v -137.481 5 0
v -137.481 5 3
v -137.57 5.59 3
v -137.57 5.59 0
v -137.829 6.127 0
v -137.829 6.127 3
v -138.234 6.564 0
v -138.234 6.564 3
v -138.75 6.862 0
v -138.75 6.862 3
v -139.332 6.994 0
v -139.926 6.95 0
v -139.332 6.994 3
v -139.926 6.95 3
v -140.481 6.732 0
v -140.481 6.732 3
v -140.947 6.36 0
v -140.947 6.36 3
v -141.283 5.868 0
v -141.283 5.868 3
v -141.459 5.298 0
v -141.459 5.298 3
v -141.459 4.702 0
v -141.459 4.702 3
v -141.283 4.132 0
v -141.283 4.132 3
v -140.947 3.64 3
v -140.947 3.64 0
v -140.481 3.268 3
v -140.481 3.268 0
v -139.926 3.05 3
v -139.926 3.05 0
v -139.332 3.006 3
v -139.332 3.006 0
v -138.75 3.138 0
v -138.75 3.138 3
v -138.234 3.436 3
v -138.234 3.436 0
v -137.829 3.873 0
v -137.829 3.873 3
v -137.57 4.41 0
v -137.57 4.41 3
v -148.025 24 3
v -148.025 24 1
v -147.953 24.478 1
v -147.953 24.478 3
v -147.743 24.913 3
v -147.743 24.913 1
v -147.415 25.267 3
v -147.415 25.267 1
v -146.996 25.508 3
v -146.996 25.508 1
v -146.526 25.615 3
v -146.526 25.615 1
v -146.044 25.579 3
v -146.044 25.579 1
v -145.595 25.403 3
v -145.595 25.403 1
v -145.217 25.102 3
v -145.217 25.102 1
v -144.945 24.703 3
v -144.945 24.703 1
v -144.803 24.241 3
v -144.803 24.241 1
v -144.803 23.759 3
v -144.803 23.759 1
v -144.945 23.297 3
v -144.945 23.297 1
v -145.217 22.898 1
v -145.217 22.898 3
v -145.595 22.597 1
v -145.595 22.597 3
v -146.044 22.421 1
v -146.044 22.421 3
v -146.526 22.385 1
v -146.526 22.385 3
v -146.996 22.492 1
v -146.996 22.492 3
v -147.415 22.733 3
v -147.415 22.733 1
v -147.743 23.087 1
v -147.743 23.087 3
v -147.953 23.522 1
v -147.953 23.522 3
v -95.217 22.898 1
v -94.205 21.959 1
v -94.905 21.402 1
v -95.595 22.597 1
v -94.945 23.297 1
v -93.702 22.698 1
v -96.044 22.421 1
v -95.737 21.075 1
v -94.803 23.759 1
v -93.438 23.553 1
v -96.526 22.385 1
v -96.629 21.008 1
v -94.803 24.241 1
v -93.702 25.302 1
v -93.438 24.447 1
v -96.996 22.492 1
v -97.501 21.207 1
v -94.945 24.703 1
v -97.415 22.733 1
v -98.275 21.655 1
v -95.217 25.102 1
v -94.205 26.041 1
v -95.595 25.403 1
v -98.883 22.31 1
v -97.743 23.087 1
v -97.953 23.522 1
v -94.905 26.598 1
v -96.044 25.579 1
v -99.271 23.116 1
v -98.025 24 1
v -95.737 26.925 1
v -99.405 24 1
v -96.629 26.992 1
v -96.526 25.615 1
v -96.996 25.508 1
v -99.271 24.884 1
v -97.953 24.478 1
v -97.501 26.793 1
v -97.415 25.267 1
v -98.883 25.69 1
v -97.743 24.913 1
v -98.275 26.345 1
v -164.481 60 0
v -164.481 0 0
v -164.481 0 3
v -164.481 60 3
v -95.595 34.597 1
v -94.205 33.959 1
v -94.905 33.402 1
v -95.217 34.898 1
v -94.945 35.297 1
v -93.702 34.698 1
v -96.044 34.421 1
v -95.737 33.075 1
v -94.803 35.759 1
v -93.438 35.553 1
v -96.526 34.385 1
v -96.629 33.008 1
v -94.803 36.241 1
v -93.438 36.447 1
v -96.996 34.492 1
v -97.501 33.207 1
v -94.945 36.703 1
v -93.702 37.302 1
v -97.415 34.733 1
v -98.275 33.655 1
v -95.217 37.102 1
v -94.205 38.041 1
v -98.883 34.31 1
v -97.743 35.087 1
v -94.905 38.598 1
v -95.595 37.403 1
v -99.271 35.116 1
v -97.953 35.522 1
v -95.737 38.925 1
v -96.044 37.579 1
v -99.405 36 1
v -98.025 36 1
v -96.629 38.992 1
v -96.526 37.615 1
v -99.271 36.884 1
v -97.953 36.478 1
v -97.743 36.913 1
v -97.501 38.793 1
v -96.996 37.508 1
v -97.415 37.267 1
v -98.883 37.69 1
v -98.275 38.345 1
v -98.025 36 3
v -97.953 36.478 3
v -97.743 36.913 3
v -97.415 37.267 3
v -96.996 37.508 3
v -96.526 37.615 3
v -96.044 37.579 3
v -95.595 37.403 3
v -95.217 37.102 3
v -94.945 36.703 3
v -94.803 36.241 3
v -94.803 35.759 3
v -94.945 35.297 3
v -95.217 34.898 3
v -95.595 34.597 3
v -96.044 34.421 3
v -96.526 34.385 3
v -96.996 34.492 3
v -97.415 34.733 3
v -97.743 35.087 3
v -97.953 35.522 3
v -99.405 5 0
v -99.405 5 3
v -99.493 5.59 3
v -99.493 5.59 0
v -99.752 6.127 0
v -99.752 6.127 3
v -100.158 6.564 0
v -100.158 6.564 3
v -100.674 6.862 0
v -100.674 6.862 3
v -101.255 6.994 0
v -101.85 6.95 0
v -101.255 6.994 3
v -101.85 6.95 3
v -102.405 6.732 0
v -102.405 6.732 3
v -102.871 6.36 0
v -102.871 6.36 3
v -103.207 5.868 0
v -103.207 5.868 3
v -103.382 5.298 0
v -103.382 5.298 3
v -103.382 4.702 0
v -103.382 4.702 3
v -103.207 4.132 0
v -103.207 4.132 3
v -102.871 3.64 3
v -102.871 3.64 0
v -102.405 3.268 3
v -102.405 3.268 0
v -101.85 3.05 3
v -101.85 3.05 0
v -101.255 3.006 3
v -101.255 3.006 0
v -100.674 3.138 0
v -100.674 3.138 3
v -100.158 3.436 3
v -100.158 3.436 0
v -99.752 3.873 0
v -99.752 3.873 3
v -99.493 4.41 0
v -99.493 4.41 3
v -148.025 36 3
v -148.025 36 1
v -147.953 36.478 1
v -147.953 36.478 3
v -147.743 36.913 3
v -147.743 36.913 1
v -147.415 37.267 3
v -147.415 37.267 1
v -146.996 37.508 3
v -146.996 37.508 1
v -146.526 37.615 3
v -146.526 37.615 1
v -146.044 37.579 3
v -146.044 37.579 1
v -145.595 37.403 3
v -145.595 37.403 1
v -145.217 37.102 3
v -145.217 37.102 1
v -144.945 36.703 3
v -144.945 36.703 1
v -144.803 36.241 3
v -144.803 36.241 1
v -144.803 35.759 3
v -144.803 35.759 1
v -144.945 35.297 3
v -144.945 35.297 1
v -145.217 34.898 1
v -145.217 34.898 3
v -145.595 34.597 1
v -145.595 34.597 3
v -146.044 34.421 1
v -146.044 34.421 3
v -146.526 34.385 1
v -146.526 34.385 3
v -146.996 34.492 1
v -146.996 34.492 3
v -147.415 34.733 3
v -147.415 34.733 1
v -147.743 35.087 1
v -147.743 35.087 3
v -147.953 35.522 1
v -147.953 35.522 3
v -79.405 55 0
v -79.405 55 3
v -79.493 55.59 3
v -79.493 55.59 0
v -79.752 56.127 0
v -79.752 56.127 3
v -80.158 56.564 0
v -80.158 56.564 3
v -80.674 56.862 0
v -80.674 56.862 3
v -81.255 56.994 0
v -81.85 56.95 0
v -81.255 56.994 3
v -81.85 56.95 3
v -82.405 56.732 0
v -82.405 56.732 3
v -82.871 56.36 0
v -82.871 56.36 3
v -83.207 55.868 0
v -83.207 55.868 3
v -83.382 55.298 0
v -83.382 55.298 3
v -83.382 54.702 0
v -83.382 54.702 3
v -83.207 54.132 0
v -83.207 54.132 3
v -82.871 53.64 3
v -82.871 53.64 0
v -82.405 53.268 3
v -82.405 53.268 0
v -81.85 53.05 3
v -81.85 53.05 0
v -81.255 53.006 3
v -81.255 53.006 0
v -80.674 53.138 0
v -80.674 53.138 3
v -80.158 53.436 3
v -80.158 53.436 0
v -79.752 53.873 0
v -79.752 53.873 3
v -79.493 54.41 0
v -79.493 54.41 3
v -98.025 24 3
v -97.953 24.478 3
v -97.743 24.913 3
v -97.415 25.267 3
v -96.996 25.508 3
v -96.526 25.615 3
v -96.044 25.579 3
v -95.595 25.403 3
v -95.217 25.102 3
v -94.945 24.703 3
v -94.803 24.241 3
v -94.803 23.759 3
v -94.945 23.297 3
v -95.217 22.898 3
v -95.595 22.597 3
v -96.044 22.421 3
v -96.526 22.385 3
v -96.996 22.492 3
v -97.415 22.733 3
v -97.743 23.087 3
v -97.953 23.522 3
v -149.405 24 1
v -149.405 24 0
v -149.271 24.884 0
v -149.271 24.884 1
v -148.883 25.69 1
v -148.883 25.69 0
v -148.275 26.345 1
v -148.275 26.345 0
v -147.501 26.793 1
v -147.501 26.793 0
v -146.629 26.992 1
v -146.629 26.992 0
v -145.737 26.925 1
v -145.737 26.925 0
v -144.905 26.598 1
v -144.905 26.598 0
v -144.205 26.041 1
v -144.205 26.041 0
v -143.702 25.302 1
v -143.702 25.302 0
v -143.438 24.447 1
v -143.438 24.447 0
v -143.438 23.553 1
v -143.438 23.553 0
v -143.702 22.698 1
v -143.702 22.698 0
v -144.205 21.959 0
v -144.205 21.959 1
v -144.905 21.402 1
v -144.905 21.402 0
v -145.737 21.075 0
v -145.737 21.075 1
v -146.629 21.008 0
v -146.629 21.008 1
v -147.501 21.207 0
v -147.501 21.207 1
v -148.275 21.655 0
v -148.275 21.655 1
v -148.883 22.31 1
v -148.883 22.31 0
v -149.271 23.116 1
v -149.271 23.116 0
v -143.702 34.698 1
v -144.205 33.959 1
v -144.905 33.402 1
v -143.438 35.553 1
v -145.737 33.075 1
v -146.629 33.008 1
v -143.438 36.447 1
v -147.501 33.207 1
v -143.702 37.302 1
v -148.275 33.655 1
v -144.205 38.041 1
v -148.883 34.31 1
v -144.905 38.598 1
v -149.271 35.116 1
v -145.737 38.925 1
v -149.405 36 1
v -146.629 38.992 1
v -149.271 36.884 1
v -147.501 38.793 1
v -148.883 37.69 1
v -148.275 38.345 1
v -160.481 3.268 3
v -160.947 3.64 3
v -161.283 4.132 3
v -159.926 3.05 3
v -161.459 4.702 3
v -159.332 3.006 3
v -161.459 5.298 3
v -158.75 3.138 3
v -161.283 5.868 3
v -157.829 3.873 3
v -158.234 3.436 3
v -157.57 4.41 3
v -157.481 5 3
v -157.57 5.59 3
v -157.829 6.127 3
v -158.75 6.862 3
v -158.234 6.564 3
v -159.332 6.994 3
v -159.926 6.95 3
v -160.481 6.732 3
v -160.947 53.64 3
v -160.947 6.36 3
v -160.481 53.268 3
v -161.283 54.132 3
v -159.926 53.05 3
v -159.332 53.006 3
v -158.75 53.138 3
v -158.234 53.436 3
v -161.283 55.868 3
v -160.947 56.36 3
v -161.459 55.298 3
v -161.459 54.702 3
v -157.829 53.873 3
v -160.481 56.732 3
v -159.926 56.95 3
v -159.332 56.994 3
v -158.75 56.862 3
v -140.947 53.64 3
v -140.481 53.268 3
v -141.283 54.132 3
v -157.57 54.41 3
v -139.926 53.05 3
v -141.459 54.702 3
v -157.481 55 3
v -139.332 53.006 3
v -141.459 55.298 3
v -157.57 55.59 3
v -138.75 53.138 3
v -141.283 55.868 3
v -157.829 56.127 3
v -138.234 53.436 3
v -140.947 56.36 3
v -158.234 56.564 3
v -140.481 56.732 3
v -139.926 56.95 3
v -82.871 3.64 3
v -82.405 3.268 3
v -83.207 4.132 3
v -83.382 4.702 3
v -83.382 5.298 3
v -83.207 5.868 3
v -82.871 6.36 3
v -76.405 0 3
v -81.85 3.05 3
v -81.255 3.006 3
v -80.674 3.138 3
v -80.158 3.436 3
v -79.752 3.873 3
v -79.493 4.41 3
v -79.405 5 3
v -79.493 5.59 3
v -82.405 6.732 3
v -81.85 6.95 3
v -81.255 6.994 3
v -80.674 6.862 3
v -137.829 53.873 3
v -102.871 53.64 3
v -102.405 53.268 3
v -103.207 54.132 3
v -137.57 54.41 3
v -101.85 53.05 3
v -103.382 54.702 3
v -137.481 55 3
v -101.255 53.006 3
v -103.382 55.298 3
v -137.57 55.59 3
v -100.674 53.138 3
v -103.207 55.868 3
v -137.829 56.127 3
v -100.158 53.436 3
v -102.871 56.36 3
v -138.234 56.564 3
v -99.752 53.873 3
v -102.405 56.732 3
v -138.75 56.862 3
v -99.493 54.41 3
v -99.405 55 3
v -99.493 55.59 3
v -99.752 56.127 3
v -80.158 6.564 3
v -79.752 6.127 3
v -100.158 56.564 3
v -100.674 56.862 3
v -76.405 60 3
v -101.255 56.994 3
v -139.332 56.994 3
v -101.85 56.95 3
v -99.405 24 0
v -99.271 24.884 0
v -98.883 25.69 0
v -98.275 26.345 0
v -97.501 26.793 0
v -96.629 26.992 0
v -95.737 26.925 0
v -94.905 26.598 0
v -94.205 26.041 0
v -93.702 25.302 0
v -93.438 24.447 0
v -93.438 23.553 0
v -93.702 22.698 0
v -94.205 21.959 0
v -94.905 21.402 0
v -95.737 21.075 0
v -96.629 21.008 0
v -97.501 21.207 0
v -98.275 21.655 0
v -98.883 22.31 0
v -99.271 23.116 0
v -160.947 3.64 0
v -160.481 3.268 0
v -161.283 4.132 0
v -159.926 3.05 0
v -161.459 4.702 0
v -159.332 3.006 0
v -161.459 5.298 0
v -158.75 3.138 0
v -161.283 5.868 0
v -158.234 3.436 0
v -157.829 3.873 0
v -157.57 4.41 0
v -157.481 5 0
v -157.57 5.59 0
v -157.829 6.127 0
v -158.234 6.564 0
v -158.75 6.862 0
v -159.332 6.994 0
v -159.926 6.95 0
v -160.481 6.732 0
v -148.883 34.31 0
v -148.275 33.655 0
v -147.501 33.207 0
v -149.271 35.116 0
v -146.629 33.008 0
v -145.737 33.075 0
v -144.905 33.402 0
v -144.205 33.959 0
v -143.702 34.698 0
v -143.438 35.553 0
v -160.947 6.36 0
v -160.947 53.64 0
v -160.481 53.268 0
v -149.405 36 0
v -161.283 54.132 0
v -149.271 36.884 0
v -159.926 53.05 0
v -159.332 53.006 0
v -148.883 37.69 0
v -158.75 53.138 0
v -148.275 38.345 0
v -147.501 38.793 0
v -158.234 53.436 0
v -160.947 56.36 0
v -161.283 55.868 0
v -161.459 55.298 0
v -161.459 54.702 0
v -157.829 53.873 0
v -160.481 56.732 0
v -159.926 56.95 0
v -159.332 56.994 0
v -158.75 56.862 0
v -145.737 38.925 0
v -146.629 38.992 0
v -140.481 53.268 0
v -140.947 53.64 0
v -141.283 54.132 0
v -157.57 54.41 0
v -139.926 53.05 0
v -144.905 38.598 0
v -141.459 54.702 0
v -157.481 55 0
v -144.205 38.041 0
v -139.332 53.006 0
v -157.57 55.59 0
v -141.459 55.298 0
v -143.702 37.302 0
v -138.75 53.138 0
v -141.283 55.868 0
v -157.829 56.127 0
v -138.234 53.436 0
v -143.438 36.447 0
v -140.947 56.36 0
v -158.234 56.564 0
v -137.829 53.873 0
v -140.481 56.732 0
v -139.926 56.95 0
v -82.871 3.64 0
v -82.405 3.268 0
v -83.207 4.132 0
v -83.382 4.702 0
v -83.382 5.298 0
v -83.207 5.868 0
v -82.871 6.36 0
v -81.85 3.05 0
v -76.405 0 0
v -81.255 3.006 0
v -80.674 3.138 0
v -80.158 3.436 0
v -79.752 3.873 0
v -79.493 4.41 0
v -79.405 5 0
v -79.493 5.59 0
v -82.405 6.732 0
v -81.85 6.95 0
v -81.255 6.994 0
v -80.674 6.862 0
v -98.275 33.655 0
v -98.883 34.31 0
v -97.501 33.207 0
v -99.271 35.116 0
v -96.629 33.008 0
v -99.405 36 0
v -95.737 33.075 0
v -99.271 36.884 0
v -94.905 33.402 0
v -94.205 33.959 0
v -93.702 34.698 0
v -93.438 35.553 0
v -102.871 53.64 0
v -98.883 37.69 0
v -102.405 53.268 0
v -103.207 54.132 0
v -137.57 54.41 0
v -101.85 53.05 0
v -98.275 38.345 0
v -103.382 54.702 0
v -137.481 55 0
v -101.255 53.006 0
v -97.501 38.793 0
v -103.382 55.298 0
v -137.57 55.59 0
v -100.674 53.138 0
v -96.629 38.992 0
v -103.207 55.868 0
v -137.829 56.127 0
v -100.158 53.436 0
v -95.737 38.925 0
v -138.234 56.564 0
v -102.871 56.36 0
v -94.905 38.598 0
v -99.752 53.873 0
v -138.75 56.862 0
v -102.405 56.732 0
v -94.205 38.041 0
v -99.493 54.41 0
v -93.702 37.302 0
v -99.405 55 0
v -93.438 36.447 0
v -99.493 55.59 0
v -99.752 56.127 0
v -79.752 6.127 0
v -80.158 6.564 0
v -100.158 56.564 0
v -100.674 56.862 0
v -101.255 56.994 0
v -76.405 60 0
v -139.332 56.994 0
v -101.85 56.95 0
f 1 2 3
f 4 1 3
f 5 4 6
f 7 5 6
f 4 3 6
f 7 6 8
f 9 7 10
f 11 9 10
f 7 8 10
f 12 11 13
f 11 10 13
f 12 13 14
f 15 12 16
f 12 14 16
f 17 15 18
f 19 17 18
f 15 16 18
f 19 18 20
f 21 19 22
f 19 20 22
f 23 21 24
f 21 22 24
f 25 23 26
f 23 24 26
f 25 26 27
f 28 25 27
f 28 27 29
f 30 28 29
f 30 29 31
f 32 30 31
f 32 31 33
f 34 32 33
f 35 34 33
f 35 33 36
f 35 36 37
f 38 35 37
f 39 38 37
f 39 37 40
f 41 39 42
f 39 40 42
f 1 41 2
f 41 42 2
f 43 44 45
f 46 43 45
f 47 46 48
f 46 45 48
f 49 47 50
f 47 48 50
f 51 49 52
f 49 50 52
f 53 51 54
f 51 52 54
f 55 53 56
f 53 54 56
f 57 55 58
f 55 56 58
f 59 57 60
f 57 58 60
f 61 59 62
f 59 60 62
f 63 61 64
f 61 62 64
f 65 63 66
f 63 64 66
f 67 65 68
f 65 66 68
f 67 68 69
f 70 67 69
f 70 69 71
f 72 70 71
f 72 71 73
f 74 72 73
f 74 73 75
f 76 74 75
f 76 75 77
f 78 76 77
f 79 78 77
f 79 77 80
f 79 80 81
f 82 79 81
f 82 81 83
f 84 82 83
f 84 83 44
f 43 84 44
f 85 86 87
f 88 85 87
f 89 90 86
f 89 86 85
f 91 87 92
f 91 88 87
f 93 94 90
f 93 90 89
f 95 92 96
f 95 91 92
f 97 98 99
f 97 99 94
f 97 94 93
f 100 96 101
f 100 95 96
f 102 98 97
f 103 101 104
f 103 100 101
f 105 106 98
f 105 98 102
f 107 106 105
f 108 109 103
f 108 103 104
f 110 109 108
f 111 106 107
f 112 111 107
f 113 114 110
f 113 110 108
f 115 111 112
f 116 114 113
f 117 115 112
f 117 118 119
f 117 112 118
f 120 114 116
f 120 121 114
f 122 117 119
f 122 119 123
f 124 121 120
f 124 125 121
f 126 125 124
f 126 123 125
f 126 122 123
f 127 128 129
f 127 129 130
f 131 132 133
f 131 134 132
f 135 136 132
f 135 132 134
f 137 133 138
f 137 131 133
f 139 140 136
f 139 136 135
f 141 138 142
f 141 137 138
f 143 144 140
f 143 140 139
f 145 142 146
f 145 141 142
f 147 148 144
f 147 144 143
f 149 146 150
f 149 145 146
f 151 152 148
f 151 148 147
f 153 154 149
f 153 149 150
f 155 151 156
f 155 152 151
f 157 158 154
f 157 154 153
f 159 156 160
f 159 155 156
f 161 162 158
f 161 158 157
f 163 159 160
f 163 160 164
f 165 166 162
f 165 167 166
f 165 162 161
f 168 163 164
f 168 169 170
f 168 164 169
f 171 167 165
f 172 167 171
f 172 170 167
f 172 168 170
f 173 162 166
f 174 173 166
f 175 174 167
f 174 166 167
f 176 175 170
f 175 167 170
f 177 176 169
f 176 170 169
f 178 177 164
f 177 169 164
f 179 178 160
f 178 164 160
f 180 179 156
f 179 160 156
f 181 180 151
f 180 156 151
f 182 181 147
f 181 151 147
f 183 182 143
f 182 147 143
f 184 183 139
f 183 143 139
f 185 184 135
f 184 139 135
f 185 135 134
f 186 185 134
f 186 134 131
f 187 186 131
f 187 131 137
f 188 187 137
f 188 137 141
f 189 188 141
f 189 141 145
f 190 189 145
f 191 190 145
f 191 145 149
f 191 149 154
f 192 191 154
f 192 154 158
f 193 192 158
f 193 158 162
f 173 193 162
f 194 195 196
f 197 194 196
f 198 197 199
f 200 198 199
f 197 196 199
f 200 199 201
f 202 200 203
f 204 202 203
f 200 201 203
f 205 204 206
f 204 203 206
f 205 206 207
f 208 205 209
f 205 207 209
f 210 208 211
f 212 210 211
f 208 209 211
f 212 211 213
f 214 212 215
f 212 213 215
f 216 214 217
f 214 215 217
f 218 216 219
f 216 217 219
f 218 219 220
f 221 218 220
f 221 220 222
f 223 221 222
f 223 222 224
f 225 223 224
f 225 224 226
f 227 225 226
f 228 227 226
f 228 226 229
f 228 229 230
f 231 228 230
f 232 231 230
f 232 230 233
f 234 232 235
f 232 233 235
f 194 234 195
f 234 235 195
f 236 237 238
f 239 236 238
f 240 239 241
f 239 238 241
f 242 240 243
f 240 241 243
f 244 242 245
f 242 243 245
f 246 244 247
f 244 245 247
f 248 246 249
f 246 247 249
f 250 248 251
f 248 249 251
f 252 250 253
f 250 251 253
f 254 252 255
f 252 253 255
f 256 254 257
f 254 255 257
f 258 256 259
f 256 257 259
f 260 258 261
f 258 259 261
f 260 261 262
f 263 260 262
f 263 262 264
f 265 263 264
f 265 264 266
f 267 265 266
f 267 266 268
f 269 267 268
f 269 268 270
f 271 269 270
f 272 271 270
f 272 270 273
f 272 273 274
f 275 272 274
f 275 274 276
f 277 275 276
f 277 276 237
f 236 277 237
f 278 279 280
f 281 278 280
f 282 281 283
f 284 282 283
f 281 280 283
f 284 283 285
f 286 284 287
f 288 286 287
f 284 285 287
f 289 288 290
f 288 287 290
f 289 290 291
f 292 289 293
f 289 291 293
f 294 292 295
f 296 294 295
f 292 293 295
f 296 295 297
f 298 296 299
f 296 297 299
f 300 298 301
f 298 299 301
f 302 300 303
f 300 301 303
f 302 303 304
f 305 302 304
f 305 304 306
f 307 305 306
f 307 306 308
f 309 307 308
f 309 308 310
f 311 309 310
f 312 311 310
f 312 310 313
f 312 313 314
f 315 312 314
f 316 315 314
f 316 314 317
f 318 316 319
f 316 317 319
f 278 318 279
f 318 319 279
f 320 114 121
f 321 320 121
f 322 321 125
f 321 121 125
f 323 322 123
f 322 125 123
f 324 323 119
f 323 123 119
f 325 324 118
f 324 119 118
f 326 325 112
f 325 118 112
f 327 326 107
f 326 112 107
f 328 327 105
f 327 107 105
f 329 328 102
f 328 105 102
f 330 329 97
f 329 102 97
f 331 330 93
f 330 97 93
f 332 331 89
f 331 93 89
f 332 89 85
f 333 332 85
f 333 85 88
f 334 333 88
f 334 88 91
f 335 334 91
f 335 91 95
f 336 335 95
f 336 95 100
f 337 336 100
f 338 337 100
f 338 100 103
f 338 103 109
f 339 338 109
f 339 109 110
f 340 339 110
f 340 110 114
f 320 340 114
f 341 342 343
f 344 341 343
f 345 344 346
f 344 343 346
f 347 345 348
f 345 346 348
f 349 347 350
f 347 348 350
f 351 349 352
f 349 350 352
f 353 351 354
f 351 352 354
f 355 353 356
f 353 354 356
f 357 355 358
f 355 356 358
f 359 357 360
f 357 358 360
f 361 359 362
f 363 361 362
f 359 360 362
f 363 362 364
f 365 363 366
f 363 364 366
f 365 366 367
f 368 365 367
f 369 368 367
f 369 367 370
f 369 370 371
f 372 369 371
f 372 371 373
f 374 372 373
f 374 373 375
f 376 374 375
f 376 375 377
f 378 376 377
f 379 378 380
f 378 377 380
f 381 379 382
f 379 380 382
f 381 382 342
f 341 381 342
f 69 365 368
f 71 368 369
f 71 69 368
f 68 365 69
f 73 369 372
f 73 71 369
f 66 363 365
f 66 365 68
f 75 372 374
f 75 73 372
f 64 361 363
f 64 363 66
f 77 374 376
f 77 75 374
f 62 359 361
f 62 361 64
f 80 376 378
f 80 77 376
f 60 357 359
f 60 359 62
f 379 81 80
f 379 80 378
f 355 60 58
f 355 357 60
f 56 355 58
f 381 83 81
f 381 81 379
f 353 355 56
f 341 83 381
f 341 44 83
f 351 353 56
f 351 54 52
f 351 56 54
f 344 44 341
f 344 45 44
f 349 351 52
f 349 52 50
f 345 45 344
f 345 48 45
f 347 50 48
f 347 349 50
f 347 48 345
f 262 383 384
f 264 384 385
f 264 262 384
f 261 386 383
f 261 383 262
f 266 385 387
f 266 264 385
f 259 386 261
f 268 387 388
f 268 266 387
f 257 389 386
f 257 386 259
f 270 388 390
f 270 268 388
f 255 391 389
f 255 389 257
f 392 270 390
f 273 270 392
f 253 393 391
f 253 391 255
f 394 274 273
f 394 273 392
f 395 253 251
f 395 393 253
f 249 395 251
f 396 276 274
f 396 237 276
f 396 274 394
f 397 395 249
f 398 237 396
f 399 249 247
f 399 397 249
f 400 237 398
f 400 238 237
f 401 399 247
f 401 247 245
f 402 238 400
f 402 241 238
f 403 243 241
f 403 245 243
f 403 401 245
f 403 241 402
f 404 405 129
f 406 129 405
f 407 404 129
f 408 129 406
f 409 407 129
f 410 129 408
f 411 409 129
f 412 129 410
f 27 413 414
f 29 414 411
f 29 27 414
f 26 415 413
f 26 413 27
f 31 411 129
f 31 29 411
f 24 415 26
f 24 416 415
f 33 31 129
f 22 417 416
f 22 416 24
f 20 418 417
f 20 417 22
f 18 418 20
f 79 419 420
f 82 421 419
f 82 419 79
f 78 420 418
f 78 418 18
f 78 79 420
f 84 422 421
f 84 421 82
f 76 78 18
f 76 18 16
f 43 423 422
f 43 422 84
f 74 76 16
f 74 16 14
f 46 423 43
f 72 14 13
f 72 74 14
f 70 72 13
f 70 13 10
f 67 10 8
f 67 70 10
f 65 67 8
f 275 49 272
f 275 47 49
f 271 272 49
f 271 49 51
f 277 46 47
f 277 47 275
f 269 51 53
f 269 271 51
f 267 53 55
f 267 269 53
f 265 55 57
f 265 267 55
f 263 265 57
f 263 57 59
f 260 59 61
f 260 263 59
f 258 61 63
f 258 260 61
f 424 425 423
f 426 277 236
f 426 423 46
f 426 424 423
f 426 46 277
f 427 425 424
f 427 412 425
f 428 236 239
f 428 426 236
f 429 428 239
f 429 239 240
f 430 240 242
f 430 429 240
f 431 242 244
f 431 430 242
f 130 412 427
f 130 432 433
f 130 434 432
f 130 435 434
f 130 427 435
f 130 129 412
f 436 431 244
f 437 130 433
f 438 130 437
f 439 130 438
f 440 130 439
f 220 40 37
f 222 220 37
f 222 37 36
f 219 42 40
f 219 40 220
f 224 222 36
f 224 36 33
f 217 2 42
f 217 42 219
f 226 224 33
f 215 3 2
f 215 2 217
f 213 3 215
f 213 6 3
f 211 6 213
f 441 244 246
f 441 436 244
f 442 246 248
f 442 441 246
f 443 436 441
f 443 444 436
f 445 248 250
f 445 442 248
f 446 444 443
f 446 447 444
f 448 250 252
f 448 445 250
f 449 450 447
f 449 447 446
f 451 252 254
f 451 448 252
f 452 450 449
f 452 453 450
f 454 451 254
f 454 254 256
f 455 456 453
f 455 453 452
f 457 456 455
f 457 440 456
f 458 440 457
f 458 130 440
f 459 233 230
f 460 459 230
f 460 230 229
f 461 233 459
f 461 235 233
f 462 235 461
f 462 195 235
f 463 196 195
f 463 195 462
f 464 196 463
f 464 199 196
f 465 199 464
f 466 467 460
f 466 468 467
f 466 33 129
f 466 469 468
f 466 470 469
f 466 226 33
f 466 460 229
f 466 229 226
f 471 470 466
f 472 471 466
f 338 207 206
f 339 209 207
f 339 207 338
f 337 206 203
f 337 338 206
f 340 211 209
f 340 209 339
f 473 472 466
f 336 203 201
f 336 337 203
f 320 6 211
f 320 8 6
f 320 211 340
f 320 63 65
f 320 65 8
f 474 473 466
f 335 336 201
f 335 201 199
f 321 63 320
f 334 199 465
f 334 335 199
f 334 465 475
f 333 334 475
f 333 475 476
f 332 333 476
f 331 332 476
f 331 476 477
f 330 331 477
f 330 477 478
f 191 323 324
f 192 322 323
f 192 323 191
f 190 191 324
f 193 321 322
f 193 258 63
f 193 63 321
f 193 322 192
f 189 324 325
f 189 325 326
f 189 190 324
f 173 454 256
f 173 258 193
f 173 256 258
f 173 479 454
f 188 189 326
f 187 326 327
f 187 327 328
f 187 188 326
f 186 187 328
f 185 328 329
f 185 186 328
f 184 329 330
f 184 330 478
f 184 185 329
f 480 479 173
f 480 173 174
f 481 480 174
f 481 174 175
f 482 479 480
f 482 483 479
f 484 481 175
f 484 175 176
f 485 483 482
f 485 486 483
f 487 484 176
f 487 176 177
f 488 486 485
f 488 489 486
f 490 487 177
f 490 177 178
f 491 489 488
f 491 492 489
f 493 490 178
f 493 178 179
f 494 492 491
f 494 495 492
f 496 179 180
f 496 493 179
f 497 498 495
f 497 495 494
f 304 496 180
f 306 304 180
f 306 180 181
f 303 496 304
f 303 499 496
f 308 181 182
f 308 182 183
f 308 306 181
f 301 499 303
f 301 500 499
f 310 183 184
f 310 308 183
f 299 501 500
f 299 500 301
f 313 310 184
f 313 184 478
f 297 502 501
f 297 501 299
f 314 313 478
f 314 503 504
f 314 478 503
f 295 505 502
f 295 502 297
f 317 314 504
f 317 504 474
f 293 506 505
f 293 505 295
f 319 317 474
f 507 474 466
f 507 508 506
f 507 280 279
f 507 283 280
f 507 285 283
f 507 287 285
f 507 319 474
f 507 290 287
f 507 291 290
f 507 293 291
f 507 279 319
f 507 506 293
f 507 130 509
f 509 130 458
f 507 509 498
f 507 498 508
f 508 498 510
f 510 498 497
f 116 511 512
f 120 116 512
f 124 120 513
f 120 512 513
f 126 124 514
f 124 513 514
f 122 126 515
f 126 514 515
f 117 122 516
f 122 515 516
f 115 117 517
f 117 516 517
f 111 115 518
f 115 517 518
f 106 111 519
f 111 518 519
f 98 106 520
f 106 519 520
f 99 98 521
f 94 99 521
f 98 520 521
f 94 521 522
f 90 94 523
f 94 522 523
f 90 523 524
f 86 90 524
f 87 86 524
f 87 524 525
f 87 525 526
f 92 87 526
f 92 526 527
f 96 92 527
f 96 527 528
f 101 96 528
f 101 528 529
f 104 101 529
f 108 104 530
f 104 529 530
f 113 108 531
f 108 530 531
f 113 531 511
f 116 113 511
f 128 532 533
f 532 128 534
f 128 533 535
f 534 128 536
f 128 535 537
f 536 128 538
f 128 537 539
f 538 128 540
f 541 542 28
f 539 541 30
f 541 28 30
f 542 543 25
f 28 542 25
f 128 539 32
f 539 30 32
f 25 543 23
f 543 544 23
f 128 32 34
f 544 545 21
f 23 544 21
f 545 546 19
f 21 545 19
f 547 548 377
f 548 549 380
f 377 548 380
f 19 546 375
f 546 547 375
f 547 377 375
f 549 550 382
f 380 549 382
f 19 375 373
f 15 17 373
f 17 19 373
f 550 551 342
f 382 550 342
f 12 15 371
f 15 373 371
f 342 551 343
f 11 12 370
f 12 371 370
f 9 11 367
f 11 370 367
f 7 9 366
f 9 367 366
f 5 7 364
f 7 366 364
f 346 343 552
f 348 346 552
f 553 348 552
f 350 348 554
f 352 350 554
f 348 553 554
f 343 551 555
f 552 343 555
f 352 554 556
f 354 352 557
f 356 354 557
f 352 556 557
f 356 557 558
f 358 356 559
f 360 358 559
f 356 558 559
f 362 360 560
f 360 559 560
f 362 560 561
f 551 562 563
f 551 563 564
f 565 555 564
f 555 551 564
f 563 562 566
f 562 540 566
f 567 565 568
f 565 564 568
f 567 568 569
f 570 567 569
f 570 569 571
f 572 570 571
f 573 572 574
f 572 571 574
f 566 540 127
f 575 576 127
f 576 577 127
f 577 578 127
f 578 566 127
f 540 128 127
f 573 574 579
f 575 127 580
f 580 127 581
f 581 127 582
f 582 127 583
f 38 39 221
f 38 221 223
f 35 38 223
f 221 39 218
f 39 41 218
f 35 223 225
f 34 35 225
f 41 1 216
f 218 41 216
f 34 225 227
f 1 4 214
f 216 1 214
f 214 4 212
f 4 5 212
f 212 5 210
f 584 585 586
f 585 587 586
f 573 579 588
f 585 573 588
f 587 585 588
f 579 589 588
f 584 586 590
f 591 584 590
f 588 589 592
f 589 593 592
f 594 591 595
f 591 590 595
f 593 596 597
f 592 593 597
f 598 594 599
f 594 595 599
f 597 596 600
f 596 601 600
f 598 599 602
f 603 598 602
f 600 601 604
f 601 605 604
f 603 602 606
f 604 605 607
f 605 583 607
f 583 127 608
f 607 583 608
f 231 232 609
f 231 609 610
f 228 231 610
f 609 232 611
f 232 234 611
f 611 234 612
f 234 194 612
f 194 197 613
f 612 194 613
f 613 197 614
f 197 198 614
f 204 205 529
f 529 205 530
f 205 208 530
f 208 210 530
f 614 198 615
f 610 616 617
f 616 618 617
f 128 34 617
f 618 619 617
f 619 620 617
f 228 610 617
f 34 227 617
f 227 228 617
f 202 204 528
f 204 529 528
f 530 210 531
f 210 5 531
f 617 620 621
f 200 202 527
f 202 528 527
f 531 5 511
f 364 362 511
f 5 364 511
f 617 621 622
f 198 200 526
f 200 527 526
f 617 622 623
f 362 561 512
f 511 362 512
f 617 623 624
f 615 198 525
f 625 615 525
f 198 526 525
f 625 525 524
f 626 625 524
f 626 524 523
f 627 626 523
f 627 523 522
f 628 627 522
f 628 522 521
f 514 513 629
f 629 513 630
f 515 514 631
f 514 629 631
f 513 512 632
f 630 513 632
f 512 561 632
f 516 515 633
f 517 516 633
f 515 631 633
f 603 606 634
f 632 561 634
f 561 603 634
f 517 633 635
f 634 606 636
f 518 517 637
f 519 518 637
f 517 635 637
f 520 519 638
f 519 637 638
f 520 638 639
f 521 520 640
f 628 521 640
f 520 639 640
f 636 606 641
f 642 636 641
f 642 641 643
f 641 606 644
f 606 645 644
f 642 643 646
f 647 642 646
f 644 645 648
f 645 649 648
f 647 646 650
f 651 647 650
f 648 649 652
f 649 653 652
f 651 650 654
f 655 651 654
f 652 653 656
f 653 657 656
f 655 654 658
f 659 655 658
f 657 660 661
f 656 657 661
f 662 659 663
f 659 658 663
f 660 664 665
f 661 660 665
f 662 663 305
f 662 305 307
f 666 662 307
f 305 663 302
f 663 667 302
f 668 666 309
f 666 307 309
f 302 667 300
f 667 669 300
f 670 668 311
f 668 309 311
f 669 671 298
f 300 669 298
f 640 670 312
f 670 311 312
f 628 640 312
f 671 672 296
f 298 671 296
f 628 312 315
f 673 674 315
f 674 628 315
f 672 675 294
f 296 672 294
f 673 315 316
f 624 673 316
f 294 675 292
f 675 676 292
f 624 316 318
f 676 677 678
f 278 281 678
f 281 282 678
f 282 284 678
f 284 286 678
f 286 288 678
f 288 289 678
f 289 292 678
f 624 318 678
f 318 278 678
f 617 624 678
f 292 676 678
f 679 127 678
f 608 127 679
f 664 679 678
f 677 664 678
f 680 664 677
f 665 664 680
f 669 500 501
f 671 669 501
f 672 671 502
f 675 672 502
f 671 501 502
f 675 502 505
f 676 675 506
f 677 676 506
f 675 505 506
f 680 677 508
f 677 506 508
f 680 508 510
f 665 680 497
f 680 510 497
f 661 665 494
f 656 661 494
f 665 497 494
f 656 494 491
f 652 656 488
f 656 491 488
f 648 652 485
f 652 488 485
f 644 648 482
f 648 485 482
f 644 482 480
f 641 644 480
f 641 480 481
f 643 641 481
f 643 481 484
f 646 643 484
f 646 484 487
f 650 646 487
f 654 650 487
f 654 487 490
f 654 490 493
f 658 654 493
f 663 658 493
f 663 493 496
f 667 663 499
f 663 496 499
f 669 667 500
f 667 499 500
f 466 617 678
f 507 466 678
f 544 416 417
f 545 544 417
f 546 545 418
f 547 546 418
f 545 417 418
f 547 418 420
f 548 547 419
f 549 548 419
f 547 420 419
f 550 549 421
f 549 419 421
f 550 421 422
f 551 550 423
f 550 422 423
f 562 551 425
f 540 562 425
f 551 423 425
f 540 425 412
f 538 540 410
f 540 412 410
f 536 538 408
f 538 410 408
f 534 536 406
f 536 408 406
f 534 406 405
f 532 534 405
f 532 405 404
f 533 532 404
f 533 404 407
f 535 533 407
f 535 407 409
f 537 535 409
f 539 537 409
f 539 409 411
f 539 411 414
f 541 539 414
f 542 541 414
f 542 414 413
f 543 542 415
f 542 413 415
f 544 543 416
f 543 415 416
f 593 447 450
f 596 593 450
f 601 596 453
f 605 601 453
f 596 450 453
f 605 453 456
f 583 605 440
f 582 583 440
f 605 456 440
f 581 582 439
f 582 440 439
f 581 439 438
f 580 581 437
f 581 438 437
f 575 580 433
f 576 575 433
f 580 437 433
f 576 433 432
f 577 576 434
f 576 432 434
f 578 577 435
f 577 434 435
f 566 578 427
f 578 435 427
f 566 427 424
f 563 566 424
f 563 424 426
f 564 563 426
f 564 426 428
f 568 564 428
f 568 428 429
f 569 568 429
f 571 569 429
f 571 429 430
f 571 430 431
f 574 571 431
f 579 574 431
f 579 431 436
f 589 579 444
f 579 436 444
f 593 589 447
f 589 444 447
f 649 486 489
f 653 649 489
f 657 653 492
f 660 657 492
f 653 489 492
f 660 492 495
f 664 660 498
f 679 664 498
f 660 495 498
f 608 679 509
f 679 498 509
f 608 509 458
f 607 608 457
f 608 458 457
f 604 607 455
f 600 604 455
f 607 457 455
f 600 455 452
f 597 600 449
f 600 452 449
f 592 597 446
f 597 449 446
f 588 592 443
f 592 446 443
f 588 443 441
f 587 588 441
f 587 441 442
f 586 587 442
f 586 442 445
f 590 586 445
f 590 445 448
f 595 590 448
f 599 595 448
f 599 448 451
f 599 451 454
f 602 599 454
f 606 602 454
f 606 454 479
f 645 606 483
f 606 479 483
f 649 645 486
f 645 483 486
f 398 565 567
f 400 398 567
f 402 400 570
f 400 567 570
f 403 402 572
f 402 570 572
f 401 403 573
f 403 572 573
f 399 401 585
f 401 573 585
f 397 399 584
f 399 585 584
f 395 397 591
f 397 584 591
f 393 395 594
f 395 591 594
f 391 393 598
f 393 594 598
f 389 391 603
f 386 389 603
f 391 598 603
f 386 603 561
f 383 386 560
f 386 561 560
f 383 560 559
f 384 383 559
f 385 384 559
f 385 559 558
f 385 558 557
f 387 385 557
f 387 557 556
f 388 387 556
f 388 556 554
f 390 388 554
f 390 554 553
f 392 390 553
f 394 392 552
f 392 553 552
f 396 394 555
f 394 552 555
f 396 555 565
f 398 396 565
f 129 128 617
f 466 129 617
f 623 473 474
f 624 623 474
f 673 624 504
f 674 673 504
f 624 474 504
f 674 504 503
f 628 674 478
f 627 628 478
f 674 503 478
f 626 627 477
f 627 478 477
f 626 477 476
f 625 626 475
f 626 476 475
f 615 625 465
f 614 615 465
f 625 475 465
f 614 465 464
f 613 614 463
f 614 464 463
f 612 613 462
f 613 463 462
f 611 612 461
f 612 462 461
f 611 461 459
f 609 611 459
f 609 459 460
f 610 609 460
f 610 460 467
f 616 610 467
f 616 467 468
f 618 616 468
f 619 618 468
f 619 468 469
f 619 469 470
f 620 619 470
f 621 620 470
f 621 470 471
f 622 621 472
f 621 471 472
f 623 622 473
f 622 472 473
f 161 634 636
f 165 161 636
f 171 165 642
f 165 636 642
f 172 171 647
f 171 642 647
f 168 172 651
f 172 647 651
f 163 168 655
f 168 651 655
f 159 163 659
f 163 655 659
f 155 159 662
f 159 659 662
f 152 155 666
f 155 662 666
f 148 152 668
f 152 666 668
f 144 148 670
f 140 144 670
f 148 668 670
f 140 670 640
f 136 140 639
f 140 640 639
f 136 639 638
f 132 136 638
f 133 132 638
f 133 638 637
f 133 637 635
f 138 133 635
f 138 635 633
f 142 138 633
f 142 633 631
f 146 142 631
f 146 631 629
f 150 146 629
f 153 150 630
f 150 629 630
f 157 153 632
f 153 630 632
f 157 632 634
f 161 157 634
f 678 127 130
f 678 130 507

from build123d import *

# Parameters (mm, degrees)
SKETCH_1_W          = 88.07644651
SKETCH_1_H          = 60
EXTRUDE_1_DEPTH     = 3
SKETCH_2_R          = 2
CUT_EXTRUDE_1_DEPTH = 3
SKETCH_3_R          = 1.62
CUT_EXTRUDE_2_DEPTH = 3
SKETCH_4_R          = 3
CUT_EXTRUDE_3_DEPTH = 1


with BuildPart() as part:
    # 草图1 → 凸台-拉伸1 (new body)
    with BuildSketch(Plane.XY):
        with Locations((-120.442831111, 30)):
            Rectangle(SKETCH_1_W, SKETCH_1_H)
    extrude(amount=EXTRUDE_1_DEPTH)

    # 草图2 → 切除-拉伸1 (cut)
    with BuildSketch(Plane.XY.offset(3)):
        with Locations((-159.481054366, 5)):
            Circle(SKETCH_2_R)
        with Locations((-159.481054366, 55)):
            Circle(SKETCH_2_R)
        with Locations((-139.481054366, 5)):
            Circle(SKETCH_2_R)
        with Locations((-139.481054366, 55)):
            Circle(SKETCH_2_R)
        with Locations((-81.404607856, 5)):
            Circle(SKETCH_2_R)
        with Locations((-81.404607856, 55)):
            Circle(SKETCH_2_R)
        with Locations((-101.404607856, 55)):
            Circle(SKETCH_2_R)
        with Locations((-101.404607856, 5)):
            Circle(SKETCH_2_R)
    extrude(amount=-CUT_EXTRUDE_1_DEPTH, mode=Mode.SUBTRACT)

    # 草图3 → 切除-拉伸2 (cut)
    with BuildSketch(Plane(origin=(0, 0, 0), x_dir=(-1, 0, 0), z_dir=(0, 0, -1))):
        with Locations((96.404607856, 36)):
            Circle(SKETCH_3_R)
        with Locations((96.404607856, 24)):
            Circle(SKETCH_3_R)
        with Locations((146.404607856, 36)):
            Circle(SKETCH_3_R)
        with Locations((146.404607856, 24)):
            Circle(SKETCH_3_R)
    extrude(amount=-CUT_EXTRUDE_2_DEPTH, mode=Mode.SUBTRACT)

    # 草图4 → 切除-拉伸3 (cut)
    with BuildSketch(Plane(origin=(0, 0, 0), x_dir=(-1, 0, 0), z_dir=(0, 0, -1))):
        with Locations((96.404607856, 36)):
            Circle(SKETCH_4_R)
        with Locations((96.404607856, 24)):
            Circle(SKETCH_4_R)
        with Locations((146.404607856, 36)):
            Circle(SKETCH_4_R)
        with Locations((146.404607856, 24)):
            Circle(SKETCH_4_R)
    extrude(amount=-CUT_EXTRUDE_3_DEPTH, mode=Mode.SUBTRACT)


solid = part.part
